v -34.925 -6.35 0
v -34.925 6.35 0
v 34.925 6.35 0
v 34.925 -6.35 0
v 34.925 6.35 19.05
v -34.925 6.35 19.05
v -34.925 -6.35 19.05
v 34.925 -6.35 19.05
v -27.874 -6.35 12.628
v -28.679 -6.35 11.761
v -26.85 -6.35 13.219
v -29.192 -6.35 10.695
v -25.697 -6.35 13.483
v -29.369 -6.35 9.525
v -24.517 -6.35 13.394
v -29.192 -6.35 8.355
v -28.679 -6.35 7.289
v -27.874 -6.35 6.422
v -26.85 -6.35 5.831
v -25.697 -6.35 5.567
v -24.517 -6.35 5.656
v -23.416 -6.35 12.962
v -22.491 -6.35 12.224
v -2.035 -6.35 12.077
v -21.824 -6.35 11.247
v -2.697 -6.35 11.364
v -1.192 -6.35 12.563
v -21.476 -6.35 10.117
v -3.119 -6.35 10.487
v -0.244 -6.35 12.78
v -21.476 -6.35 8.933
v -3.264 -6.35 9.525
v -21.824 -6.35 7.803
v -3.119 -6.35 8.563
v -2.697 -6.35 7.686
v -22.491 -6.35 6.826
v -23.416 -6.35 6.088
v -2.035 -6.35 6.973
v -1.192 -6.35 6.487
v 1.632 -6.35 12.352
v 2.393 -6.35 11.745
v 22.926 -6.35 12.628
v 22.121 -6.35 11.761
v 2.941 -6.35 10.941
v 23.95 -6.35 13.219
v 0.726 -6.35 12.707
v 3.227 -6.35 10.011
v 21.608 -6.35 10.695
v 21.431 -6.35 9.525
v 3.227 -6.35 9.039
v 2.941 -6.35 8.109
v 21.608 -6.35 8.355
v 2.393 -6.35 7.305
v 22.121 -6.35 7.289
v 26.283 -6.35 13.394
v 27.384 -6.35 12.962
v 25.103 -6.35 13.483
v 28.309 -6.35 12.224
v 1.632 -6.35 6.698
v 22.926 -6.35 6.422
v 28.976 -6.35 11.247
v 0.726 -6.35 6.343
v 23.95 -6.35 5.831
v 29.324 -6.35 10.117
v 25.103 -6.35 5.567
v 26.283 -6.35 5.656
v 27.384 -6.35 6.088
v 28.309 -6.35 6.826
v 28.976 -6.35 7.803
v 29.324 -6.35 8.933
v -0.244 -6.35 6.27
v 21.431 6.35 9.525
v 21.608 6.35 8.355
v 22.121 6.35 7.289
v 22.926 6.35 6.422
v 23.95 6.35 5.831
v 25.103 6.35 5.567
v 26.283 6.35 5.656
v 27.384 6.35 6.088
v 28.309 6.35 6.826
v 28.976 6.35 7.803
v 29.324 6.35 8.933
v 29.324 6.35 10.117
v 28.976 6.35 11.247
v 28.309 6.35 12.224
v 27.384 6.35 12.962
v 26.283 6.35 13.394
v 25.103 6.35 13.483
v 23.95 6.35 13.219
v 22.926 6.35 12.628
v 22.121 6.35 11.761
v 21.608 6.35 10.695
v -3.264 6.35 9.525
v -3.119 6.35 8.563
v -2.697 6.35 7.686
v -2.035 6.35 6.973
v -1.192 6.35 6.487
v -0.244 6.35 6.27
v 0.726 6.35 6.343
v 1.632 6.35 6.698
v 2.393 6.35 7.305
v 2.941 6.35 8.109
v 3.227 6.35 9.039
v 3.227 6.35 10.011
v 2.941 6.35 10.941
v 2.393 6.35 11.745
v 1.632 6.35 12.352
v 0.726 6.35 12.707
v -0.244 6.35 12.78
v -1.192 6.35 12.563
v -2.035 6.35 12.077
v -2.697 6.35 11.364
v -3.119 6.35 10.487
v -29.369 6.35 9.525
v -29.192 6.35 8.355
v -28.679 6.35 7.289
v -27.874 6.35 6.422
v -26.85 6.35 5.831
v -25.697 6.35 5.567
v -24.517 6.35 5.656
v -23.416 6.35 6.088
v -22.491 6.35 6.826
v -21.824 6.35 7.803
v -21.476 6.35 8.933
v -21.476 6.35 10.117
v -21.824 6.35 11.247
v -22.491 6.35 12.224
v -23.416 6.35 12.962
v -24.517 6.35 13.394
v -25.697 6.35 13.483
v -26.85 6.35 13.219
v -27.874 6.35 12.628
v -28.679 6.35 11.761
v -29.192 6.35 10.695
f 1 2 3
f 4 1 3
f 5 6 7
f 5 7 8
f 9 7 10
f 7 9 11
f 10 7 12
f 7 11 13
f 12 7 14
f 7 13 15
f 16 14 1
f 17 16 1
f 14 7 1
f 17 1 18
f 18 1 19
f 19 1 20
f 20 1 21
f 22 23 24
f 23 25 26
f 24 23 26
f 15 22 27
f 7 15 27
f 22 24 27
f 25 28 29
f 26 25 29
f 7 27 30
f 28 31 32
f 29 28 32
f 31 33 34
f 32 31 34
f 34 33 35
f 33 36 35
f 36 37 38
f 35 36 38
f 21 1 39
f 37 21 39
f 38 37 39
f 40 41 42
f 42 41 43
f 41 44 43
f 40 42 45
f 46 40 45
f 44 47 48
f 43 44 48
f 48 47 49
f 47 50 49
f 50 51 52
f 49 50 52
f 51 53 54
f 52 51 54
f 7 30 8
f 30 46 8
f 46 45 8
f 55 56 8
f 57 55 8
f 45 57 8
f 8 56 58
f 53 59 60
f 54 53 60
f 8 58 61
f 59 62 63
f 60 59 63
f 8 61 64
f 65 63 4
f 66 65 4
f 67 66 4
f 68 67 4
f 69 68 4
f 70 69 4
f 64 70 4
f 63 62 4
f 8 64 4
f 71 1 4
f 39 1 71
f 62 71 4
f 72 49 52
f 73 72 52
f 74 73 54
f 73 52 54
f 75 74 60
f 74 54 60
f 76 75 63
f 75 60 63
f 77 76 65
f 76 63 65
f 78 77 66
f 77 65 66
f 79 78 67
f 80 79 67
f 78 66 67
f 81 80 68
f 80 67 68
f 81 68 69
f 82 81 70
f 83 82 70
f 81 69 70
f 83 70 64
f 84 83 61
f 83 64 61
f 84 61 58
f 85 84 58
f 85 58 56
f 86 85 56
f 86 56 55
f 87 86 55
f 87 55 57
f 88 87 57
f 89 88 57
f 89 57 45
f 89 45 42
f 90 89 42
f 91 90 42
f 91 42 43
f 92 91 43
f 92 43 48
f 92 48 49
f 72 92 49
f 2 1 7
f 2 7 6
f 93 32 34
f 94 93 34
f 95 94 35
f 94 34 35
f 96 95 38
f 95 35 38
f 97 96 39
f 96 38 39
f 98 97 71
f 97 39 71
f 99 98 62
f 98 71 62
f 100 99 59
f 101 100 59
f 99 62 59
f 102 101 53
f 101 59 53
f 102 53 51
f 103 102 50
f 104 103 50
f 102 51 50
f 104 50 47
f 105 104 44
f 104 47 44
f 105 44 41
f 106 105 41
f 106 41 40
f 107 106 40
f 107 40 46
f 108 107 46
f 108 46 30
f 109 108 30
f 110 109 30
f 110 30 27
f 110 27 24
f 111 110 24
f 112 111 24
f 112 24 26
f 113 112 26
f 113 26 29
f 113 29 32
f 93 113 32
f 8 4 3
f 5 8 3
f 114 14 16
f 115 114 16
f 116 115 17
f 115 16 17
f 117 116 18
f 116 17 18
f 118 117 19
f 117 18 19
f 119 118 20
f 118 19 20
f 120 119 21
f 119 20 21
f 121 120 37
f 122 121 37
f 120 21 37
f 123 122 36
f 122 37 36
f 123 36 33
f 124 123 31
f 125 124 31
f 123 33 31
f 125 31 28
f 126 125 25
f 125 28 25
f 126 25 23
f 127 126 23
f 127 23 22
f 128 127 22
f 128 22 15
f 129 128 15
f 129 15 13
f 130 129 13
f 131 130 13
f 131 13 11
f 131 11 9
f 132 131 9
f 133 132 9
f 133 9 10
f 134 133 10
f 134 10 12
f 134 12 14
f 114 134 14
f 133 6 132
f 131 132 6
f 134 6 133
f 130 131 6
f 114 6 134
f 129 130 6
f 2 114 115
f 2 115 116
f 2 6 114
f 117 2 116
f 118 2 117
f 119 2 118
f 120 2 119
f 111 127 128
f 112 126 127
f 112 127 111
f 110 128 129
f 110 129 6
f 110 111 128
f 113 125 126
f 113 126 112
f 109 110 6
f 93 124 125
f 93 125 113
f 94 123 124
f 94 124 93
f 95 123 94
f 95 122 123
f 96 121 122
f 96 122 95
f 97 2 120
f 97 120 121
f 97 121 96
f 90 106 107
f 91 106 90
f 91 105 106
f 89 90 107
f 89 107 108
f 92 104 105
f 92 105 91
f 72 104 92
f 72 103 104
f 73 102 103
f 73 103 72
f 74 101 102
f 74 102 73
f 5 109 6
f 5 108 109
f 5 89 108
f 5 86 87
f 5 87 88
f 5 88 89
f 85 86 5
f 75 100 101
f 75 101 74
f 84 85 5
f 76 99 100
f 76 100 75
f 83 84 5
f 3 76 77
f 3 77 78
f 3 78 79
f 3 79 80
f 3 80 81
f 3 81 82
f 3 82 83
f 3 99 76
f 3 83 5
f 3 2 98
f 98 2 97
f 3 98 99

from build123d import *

# Parameters (mm, degrees)
SKETCH1_W                      = 69.85
SKETCH1_H                      = 12.7
BOSS_EXTRUDE1_DEPTH            = 19.05
F_5_16_0_3125_DIAMETER_HOLE1_D = 7.9375
F_5_16_18_TAPPED_HOLE1_D       = 6.5278


with BuildPart() as part:
    # Sketch1 → Boss-Extrude1 (new body)
    with BuildSketch(Plane.XY):
        Rectangle(SKETCH1_W, SKETCH1_H)
    extrude(amount=BOSS_EXTRUDE1_DEPTH)

    # 5/16 (0.3125) Diameter Hole1 (through all)
    with Locations(Plane(origin=(0, 6.35, 0), x_dir=(1, 0, 0), z_dir=(0, 1, 0))):
        with Locations((-25.4, -9.525), (25.4, -9.525)):
            Hole(F_5_16_0_3125_DIAMETER_HOLE1_D / 2)

    # 5/16-18 Tapped Hole1 (through all)
    with Locations(Plane(origin=(0, 6.35, 0), x_dir=(1, 0, 0), z_dir=(0, 1, 0))):
        with Locations((0, -9.525)):
            Hole(F_5_16_18_TAPPED_HOLE1_D / 2)


solid = part.part
